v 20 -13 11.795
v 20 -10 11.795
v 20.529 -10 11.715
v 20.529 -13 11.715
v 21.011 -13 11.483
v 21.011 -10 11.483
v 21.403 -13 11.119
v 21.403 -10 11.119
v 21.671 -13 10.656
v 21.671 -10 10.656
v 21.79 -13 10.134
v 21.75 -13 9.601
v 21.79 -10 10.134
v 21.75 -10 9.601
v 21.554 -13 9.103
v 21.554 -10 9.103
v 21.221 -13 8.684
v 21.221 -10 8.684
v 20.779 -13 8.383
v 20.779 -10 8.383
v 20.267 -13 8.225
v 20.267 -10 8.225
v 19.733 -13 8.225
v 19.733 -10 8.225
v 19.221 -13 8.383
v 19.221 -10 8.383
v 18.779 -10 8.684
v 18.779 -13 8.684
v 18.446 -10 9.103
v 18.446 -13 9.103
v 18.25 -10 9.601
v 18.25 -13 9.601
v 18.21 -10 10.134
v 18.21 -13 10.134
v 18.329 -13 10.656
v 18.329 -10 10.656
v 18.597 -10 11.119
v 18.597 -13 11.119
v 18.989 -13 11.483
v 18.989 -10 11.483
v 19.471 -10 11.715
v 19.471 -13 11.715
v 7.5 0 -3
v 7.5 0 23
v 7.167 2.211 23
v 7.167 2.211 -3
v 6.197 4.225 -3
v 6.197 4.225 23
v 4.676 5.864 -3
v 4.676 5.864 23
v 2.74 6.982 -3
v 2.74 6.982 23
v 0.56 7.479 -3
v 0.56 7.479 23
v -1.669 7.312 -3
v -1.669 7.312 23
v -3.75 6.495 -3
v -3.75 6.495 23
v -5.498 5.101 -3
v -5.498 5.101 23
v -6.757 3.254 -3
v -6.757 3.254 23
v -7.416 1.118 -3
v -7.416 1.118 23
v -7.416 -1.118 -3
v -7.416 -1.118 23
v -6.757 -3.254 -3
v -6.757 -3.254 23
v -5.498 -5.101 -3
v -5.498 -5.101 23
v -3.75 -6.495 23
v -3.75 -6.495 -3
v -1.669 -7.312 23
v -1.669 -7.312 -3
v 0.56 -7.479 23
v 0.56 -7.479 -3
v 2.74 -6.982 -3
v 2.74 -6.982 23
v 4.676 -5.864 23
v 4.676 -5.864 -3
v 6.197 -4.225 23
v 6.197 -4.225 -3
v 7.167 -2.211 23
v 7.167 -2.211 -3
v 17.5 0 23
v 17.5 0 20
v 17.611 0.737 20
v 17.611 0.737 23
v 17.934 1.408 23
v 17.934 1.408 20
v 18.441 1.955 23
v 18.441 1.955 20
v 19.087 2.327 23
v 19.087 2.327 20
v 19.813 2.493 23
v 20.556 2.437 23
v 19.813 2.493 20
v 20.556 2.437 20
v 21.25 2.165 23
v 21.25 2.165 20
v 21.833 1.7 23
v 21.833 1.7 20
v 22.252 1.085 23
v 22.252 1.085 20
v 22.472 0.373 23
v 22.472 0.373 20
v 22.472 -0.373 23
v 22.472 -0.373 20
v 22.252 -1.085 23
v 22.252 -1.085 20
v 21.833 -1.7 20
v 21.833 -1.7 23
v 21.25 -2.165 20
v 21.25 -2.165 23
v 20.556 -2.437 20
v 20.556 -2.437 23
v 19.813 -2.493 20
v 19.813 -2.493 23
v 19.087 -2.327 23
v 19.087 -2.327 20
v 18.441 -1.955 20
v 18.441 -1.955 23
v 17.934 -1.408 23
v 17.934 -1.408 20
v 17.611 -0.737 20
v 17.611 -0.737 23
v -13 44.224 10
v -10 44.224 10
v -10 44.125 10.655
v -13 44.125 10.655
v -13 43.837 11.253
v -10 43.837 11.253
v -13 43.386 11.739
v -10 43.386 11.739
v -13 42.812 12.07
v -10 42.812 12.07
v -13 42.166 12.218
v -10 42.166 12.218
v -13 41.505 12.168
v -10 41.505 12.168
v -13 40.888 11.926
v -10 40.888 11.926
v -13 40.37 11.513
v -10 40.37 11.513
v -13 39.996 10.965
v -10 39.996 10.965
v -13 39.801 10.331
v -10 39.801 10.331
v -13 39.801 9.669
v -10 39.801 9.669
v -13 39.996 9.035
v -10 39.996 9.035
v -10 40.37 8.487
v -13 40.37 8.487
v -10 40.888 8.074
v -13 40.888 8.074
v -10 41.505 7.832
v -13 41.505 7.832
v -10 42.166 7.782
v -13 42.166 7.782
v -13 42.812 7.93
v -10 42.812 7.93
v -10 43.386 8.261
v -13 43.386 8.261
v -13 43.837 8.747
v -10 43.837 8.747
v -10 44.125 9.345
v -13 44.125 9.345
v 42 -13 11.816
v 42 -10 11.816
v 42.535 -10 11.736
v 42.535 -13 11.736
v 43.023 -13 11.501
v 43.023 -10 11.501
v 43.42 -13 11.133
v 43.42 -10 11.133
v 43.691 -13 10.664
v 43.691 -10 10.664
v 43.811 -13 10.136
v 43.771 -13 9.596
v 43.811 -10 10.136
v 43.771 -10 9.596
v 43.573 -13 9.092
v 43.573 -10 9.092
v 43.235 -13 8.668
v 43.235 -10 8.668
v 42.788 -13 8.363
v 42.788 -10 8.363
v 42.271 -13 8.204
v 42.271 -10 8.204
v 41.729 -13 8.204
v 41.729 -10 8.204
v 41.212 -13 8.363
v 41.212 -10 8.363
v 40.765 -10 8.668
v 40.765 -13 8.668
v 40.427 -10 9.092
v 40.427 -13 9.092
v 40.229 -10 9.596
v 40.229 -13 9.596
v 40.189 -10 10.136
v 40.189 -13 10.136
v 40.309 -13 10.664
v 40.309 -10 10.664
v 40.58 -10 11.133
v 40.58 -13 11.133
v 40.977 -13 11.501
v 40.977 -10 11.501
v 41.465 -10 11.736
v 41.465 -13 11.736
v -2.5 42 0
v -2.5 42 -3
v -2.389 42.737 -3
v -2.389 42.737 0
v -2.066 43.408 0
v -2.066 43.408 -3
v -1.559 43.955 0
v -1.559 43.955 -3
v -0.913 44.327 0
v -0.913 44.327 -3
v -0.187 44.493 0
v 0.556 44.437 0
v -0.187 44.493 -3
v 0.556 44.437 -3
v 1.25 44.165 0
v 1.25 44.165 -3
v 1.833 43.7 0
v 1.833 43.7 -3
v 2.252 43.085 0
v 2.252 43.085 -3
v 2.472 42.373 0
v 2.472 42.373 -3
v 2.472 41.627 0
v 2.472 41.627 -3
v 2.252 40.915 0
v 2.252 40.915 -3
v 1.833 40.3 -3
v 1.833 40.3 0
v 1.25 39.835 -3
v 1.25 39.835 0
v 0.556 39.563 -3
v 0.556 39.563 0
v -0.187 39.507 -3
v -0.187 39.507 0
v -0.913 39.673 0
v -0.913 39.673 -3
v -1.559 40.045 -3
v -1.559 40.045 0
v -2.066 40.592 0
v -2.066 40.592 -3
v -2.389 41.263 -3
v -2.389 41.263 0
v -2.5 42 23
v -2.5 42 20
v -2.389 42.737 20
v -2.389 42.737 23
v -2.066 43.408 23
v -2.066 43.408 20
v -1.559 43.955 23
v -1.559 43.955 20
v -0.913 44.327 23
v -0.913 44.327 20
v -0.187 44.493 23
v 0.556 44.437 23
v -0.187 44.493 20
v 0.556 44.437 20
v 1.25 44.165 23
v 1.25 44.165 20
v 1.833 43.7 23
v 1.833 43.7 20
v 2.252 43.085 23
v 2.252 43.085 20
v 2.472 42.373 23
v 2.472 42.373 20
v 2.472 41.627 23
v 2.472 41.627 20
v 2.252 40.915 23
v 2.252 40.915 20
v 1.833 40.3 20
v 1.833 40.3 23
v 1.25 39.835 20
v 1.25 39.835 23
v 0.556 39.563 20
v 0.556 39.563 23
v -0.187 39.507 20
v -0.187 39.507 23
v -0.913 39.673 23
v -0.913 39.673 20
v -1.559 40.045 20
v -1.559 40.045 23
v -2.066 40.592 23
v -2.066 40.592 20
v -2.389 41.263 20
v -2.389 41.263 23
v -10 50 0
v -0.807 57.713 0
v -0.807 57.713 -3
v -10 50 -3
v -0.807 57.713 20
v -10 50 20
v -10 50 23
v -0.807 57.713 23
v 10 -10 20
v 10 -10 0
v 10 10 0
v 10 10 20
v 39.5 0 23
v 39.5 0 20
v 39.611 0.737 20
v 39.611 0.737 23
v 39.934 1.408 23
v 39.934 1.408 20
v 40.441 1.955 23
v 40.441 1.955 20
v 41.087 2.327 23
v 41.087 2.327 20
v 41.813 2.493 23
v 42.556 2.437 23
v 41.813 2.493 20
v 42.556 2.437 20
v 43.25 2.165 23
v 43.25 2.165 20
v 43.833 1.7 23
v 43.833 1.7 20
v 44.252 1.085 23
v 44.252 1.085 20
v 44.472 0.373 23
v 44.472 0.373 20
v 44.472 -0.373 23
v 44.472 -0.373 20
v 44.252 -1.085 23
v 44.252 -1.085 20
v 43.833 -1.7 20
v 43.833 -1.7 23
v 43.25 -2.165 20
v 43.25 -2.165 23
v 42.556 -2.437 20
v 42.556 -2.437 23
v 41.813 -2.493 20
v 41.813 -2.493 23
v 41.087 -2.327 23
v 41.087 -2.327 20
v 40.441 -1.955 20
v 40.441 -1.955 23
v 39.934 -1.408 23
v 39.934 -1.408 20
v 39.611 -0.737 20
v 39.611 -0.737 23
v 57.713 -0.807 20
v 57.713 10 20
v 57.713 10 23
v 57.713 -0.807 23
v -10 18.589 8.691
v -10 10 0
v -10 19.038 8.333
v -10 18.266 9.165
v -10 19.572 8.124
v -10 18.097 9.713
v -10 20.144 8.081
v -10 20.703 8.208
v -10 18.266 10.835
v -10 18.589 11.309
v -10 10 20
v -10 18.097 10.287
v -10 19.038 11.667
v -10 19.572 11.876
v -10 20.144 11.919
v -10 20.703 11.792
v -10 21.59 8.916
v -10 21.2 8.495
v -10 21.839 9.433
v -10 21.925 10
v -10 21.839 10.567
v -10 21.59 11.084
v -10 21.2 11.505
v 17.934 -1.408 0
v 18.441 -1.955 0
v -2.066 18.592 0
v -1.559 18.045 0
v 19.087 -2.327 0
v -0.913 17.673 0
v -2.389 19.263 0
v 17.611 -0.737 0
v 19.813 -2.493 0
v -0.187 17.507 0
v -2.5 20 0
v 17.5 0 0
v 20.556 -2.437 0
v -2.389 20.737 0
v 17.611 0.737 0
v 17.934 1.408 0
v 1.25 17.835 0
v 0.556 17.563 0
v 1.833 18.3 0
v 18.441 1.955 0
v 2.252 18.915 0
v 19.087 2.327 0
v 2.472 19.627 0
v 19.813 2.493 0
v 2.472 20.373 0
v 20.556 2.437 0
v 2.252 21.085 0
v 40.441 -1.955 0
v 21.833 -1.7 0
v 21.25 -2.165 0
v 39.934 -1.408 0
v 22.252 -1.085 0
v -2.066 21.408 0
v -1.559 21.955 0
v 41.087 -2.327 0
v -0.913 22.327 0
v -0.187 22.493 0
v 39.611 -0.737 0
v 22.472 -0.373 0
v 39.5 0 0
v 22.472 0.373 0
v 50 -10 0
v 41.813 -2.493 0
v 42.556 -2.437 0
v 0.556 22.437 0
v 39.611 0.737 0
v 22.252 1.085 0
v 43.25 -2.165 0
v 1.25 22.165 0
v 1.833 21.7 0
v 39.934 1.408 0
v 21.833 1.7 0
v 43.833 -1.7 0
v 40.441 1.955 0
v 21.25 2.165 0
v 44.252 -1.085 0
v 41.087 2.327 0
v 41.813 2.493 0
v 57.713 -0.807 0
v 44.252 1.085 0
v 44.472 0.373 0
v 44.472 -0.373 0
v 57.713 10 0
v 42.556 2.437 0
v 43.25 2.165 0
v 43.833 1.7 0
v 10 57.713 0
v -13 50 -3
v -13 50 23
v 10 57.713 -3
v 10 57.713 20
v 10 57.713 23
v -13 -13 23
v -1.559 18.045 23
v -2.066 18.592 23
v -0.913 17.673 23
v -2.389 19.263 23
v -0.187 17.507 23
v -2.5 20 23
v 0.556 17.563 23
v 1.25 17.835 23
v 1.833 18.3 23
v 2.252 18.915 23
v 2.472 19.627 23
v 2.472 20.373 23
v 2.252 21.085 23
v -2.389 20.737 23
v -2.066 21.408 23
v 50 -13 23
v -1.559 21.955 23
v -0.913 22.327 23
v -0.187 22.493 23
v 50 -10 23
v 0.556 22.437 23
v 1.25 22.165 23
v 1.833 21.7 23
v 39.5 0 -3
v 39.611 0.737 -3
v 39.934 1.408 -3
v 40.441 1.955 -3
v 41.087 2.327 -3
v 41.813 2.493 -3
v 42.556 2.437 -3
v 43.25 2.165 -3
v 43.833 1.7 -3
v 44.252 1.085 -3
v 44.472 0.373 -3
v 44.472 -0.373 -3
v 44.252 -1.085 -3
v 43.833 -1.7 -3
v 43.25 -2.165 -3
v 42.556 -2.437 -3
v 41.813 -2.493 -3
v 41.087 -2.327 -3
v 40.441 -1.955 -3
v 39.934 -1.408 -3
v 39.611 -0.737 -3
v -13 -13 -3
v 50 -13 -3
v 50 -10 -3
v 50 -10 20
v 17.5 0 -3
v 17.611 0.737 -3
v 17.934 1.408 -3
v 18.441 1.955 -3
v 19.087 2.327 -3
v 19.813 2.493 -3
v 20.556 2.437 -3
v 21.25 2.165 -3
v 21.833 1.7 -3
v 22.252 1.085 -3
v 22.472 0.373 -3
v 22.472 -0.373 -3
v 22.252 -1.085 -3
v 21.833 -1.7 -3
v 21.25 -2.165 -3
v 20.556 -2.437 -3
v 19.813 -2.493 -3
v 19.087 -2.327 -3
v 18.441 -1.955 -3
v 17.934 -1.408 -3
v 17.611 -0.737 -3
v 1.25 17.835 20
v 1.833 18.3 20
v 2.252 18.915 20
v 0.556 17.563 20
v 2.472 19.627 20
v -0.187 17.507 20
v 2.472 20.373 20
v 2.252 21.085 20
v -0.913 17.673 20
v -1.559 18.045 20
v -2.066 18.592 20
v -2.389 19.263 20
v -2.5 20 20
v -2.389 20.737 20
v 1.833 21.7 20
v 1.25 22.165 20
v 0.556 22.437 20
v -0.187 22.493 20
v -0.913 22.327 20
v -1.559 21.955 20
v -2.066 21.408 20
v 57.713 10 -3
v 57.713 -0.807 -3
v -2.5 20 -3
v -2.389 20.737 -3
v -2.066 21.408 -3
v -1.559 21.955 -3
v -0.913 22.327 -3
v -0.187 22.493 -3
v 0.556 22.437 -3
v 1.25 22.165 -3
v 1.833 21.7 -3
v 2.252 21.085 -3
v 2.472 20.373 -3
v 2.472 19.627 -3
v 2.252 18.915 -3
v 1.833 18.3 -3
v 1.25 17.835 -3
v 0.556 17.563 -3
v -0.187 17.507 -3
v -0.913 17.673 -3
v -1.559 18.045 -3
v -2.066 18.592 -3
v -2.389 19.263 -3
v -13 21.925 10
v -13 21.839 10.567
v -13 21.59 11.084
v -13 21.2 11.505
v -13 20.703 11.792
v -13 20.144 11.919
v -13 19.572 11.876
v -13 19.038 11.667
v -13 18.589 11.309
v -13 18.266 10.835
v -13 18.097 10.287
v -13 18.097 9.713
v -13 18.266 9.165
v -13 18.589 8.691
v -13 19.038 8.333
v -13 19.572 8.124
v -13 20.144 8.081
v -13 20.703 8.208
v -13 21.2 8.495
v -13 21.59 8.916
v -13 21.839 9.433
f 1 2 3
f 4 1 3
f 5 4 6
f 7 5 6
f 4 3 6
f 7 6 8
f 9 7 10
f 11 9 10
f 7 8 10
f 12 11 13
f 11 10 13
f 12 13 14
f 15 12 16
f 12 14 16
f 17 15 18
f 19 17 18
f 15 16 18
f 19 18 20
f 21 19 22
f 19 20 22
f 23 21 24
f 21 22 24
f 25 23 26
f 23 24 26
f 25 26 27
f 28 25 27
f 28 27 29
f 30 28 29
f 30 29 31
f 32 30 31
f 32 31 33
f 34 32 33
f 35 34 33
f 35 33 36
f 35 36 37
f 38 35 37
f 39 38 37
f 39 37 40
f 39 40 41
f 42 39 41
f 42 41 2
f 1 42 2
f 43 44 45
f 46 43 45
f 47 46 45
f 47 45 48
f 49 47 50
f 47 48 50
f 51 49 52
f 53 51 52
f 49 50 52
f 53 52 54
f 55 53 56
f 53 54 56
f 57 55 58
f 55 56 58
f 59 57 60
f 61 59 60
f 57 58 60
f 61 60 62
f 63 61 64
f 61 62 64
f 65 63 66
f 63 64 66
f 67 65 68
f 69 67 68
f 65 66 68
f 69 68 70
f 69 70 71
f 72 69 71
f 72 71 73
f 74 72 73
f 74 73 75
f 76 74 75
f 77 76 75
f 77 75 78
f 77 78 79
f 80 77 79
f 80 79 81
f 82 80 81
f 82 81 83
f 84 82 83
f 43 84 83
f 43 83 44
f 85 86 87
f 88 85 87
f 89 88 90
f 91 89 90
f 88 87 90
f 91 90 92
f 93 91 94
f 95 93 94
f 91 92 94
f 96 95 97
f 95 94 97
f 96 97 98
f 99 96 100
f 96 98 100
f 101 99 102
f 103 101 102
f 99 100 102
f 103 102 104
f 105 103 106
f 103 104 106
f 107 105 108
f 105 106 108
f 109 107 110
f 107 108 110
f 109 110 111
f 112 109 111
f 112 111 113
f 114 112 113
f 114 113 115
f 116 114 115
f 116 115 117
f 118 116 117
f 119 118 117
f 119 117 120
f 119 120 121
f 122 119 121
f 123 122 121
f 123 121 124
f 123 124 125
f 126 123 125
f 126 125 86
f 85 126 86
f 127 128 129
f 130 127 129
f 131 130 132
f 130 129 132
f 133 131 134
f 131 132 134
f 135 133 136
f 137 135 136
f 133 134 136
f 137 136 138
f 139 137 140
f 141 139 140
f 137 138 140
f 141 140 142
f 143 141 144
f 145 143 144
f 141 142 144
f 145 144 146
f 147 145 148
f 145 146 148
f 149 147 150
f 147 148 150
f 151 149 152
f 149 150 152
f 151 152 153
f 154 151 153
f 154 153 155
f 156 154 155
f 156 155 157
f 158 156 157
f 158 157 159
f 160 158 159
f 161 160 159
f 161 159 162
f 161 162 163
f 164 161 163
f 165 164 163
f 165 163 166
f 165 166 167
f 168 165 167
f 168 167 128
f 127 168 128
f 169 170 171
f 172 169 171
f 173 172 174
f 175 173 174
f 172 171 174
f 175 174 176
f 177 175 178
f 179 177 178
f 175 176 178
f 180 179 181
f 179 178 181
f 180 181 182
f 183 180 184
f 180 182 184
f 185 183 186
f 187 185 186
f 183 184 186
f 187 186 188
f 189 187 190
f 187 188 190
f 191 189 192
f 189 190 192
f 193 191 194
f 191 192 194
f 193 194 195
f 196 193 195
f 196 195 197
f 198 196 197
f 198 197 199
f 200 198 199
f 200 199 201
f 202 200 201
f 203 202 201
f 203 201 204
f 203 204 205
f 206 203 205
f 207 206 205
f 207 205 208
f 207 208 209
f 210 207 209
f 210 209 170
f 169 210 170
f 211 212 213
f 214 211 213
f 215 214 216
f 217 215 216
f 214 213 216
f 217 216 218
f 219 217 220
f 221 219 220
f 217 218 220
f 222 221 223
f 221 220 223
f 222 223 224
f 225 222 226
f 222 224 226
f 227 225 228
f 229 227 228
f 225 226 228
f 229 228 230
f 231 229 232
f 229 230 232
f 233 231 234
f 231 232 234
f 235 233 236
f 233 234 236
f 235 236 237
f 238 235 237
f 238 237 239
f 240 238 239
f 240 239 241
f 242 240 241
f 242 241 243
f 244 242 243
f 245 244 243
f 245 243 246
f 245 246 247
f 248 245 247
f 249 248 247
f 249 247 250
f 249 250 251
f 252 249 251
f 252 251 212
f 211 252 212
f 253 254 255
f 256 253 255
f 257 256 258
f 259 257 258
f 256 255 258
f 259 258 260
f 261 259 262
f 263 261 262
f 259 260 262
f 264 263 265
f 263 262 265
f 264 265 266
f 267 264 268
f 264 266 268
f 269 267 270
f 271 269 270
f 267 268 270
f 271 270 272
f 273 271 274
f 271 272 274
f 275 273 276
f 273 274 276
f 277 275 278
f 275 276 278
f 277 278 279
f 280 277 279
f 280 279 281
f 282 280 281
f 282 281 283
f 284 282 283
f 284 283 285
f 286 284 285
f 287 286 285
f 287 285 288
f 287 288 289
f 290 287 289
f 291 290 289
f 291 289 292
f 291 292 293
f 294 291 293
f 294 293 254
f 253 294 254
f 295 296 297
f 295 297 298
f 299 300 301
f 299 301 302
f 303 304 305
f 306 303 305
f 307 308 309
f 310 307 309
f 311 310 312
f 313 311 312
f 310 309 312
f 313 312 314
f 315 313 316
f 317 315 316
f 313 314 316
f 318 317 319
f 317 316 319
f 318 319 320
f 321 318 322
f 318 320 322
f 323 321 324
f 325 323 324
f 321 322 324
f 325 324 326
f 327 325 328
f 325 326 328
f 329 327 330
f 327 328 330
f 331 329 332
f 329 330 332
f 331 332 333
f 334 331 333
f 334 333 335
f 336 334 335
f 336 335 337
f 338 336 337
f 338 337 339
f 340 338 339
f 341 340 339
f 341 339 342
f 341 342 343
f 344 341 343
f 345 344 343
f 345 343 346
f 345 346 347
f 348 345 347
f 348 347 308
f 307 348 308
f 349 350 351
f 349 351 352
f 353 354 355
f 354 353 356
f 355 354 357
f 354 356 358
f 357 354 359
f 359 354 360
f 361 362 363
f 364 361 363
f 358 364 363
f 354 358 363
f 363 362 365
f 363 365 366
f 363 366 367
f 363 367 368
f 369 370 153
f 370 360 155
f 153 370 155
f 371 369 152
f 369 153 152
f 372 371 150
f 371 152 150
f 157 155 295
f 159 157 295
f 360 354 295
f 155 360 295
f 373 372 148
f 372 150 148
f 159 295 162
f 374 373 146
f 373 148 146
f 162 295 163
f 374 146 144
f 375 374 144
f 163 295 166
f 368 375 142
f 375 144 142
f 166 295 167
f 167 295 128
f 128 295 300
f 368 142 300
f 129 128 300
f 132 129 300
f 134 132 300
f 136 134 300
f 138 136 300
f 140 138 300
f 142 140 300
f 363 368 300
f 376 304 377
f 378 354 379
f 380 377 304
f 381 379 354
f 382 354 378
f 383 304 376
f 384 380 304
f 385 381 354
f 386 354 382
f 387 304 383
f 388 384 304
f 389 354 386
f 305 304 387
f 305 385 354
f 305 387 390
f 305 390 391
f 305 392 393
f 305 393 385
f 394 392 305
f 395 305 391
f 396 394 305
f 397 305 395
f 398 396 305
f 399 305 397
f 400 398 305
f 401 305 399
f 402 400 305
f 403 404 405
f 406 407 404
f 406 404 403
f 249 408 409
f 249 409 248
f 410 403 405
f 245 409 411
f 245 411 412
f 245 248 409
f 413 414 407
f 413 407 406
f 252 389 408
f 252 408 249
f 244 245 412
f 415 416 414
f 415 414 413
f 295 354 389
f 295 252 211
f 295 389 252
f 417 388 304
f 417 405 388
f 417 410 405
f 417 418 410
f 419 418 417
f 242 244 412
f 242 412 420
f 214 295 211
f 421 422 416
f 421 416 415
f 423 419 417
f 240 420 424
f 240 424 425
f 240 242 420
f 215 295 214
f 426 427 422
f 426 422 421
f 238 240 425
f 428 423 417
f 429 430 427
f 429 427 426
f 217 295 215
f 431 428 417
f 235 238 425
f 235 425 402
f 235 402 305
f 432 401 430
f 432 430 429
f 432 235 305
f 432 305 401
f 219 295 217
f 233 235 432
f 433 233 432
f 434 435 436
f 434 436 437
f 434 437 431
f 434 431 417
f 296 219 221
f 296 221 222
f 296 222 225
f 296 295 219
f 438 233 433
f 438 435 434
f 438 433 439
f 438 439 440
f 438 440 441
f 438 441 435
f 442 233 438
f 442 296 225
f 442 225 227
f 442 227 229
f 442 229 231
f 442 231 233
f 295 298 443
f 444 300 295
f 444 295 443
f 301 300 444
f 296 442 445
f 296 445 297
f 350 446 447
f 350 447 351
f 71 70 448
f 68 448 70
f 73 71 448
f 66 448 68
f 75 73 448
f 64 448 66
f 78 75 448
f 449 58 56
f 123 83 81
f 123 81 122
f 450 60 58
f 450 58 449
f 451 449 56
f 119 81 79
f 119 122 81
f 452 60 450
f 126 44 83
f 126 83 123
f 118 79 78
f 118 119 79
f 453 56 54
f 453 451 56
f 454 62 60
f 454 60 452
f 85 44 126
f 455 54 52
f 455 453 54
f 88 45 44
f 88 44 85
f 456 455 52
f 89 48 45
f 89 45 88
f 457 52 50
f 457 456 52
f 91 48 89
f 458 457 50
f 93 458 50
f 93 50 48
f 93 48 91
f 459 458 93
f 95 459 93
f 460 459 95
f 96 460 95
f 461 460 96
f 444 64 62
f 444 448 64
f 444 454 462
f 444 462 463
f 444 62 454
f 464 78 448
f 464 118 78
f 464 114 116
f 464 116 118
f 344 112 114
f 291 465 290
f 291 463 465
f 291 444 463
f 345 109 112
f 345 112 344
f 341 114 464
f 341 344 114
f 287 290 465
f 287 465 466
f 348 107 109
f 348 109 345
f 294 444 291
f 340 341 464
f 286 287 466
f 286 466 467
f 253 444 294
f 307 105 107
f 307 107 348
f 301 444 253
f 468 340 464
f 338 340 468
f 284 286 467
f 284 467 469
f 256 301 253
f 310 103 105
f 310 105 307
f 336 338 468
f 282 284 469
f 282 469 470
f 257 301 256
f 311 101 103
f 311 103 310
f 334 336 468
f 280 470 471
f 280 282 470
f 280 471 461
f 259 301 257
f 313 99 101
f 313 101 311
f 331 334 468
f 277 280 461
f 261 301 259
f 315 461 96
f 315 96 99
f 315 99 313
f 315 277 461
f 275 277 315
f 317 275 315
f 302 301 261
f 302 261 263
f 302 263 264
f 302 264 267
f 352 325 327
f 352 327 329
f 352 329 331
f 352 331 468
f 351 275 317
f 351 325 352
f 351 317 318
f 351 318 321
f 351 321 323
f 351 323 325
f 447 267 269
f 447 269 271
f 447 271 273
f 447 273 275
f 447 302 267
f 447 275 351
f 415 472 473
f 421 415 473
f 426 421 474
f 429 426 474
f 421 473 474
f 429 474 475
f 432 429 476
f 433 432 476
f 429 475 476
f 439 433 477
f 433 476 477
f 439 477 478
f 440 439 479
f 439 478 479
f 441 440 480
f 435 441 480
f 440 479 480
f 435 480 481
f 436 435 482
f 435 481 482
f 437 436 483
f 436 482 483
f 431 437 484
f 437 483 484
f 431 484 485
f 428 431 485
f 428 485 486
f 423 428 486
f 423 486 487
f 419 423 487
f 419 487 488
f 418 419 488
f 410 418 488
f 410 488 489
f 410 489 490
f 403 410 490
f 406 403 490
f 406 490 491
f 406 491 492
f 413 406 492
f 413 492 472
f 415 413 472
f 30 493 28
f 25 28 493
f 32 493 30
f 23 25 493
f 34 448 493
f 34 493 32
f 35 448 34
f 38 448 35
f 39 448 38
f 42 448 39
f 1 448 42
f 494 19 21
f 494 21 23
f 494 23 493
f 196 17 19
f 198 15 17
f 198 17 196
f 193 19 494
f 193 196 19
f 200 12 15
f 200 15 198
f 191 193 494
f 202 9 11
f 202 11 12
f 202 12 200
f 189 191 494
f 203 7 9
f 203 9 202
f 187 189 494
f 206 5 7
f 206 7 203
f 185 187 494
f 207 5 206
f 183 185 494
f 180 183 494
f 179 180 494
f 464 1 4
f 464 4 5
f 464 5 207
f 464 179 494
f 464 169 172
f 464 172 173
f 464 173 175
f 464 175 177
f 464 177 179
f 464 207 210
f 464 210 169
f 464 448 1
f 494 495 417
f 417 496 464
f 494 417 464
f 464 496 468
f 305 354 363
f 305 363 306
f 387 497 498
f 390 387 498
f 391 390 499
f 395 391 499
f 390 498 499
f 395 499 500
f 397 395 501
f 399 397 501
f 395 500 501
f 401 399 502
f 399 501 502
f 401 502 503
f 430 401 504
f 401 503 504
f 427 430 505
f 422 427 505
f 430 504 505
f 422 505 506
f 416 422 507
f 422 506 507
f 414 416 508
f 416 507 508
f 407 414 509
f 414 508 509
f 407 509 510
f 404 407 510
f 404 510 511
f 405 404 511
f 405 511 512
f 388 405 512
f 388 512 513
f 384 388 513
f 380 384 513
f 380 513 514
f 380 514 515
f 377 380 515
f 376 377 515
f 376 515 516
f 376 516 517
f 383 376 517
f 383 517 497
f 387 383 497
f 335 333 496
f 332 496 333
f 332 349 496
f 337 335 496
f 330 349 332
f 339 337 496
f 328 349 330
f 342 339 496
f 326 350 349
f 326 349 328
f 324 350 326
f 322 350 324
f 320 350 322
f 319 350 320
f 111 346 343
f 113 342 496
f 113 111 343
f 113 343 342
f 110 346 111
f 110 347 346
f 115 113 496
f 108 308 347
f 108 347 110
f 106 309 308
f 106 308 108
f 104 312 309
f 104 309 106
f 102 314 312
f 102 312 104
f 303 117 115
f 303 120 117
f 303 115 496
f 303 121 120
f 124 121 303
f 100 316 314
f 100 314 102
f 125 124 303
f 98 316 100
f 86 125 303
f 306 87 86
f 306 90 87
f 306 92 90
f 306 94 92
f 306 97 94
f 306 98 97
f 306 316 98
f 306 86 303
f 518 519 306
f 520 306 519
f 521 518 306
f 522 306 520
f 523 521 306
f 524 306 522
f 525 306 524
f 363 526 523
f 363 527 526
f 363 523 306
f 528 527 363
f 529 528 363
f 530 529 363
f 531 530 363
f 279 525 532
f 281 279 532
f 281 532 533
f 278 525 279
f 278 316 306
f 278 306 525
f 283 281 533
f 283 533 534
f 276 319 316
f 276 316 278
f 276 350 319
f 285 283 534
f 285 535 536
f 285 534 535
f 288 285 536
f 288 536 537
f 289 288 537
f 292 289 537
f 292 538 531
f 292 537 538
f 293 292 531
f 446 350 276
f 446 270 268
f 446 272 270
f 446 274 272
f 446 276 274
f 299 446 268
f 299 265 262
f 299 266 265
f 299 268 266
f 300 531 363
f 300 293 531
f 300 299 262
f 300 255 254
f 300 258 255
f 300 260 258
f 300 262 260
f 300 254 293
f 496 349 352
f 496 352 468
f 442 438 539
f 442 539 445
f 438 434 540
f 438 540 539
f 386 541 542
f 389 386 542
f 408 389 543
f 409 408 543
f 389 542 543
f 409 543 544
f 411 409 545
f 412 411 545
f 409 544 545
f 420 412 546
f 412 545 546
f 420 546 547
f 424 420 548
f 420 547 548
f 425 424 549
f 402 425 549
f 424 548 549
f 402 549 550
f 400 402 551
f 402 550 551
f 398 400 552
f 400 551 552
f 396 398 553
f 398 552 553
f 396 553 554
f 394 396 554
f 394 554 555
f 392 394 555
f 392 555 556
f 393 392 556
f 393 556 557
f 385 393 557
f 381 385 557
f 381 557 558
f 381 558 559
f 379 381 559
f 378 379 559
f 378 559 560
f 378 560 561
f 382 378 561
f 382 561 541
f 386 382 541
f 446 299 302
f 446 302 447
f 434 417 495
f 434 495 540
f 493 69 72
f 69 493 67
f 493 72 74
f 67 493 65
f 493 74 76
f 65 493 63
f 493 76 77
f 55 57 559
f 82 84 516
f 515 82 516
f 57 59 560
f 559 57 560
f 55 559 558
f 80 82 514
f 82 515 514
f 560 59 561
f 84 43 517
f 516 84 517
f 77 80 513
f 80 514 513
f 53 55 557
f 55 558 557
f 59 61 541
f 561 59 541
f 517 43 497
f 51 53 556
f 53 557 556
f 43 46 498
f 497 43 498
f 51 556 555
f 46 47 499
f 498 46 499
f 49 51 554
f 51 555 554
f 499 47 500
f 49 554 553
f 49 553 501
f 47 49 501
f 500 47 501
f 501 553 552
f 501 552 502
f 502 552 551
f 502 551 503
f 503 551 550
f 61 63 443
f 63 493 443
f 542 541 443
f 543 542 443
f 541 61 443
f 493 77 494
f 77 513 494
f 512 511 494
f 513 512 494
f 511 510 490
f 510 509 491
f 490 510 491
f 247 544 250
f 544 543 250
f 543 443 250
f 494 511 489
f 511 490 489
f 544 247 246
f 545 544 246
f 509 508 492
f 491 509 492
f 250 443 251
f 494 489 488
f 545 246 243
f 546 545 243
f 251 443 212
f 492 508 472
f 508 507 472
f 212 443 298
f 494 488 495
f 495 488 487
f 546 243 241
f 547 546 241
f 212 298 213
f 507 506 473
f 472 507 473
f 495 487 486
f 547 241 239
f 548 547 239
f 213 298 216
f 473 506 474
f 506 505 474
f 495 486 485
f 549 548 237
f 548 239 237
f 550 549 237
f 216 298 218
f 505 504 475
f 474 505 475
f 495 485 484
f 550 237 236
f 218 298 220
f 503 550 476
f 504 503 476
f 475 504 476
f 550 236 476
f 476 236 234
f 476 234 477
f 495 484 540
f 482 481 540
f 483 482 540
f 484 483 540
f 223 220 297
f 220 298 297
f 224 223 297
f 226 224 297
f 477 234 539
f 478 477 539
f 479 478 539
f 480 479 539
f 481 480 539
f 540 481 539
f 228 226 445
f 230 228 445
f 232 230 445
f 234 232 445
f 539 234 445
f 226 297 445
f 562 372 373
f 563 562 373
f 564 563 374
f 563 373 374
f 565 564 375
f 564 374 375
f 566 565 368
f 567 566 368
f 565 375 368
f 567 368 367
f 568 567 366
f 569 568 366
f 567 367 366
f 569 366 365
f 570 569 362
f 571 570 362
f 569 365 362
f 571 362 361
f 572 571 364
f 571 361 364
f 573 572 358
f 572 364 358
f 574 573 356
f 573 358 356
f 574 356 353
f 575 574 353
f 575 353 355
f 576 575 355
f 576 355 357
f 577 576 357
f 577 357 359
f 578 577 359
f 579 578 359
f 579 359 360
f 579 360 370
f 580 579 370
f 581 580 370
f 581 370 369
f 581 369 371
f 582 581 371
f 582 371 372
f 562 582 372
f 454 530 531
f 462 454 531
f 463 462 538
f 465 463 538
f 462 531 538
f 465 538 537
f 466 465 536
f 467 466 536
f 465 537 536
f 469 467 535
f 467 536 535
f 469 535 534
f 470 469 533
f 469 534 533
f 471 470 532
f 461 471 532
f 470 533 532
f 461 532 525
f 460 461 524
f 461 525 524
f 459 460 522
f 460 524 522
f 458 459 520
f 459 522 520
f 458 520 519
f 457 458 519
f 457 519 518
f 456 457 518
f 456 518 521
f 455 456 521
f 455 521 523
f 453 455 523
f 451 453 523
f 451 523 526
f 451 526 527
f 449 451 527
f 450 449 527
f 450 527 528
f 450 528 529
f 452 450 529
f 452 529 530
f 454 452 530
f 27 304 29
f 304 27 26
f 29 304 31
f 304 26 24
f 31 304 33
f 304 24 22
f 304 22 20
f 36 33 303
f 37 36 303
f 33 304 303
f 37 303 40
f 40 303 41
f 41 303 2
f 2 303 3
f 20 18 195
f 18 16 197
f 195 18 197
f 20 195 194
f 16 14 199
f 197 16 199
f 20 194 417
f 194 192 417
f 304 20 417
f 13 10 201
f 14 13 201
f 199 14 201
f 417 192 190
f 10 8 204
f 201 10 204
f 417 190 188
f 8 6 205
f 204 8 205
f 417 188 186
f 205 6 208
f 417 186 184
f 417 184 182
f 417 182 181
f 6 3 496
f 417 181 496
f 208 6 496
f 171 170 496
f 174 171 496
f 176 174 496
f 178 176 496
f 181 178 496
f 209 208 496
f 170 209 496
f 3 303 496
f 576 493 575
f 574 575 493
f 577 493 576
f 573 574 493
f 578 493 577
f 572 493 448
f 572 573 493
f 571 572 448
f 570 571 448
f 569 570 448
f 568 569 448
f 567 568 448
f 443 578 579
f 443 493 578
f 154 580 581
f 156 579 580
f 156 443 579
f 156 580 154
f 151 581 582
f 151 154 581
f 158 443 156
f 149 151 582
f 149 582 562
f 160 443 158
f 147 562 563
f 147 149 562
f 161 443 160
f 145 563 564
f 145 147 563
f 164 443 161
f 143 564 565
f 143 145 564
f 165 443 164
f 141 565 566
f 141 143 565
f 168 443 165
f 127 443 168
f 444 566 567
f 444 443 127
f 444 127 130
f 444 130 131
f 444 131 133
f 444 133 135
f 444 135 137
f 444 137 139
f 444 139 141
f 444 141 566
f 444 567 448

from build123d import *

# Parameters (mm, degrees)
IZIM1_W                     = 20
IZIM1_H                     = 20
Y_KSEKLIK_EKSTR_ZYON1_DEPTH = 20
Y_KSEKLIK_EKSTR_ZYON2_DEPTH = 3
Y_KSEKLIK_EKSTR_ZYON3_DEPTH = 3
IZIM4_W                     = 26
IZIM4_H                     = 60
Y_KSEKLIK_EKSTR_ZYON4_DEPTH = 3
IZIM5_W                     = 63
IZIM5_H                     = 26
Y_KSEKLIK_EKSTR_ZYON5_DEPTH = 3
IZIM6_R                     = 7.5
KES_EKSTR_ZYON1_DEPTH       = 86.660287915
IZIM7_R                     = 2.5
KES_EKSTR_ZYON2_DEPTH       = 50
IZIM8_R                     = 1.924658324
IZIM8_R_2                   = 2.223723329
KES_EKSTR_ZYON3_DEPTH       = 50
IZIM9_R                     = 1.794605822
IZIM9_R_2                   = 1.816429962
KES_EKSTR_ZYON4_DEPTH       = 50


with BuildPart() as part:
    # Çizim1 → Yükseklik-Ekstrüzyon1 (new body)
    with BuildSketch(Plane.XY):
        Rectangle(IZIM1_W, IZIM1_H)
    extrude(amount=Y_KSEKLIK_EKSTR_ZYON1_DEPTH)

    # Çizim2 → Yükseklik-Ekstrüzyon2 (add)
    with BuildSketch(Plane.XY.offset(20)):
        Polygon((-10, -10), (-10, 10), (-10, 50), (-0.807466683, 57.713451316), (10, 57.713451316), (57.713451316, 10), (57.713451316, -0.807466683), (50, -10), (10, -10), align=None)
    extrude(amount=Y_KSEKLIK_EKSTR_ZYON2_DEPTH)

    # Çizim3 → Yükseklik-Ekstrüzyon3 (add)
    with BuildSketch(Plane(origin=(0, 0, 0), x_dir=(-1, 0, 0), z_dir=(0, 0, -1))):
        Polygon((10, -10), (-50, -10), (-57.713451316, -0.807466683), (-57.713451316, 10), (-10, 57.713451316), (0.807466683, 57.713451316), (10, 50), align=None)
    extrude(amount=Y_KSEKLIK_EKSTR_ZYON3_DEPTH)

    # Çizim4 → Yükseklik-Ekstrüzyon4 (add)
    with BuildSketch(Plane.ZY.offset(10)):
        with Locations((10, 20)):
            Rectangle(IZIM4_W, IZIM4_H)
    extrude(amount=Y_KSEKLIK_EKSTR_ZYON4_DEPTH)

    # Çizim5 → Yükseklik-Ekstrüzyon5 (add)
    with BuildSketch(Plane.XZ.offset(10)):
        with Locations((18.5, 10)):
            Rectangle(IZIM5_W, IZIM5_H)
    extrude(amount=Y_KSEKLIK_EKSTR_ZYON5_DEPTH)

    # Çizim6 → Kes-Ekstrüzyon1 (cut, through all)
    with BuildSketch(Plane.XY.offset(23)):
        Circle(IZIM6_R)
    extrude(amount=-KES_EKSTR_ZYON1_DEPTH, mode=Mode.SUBTRACT)

    # Çizim7 → Kes-Ekstrüzyon2 (cut)
    with BuildSketch(Plane(origin=(0, 0, -3), x_dir=(-1, 0, 0), z_dir=(0, 0, -1))):
        with Locations((-20, 0)):
            Circle(IZIM7_R)
        with Locations((-42, 0)):
            Circle(IZIM7_R)
        with Locations((0, 20)):
            Circle(IZIM7_R)
        with Locations((0, 42)):
            Circle(IZIM7_R)
    extrude(amount=-KES_EKSTR_ZYON2_DEPTH, mode=Mode.SUBTRACT)

    # Çizim8 → Kes-Ekstrüzyon3 (cut)
    with BuildSketch(Plane(origin=(-10, 0, 0), x_dir=(0, 0, -1), z_dir=(1, 0, 0))):
        with Locations(Location((-10, 20, 0), (0, 0, 90))):
            Circle(IZIM8_R)
        with Locations(Location((-10, 42, 0), (0, 0, 90))):
            Circle(IZIM8_R_2)
    extrude(amount=-KES_EKSTR_ZYON3_DEPTH, mode=Mode.SUBTRACT)

    # Çizim9 → Kes-Ekstrüzyon4 (cut)
    with BuildSketch(Plane(origin=(0, -10, 0), x_dir=(1, 0, 0), z_dir=(0, 1, 0))):
        with Locations(Location((20, -10, 0), (0, 0, 270))):
            Circle(IZIM9_R)
        with Locations(Location((42, -10, 0), (0, 0, 270))):
            Circle(IZIM9_R_2)
    extrude(amount=-KES_EKSTR_ZYON4_DEPTH, mode=Mode.SUBTRACT)


solid = part.part
